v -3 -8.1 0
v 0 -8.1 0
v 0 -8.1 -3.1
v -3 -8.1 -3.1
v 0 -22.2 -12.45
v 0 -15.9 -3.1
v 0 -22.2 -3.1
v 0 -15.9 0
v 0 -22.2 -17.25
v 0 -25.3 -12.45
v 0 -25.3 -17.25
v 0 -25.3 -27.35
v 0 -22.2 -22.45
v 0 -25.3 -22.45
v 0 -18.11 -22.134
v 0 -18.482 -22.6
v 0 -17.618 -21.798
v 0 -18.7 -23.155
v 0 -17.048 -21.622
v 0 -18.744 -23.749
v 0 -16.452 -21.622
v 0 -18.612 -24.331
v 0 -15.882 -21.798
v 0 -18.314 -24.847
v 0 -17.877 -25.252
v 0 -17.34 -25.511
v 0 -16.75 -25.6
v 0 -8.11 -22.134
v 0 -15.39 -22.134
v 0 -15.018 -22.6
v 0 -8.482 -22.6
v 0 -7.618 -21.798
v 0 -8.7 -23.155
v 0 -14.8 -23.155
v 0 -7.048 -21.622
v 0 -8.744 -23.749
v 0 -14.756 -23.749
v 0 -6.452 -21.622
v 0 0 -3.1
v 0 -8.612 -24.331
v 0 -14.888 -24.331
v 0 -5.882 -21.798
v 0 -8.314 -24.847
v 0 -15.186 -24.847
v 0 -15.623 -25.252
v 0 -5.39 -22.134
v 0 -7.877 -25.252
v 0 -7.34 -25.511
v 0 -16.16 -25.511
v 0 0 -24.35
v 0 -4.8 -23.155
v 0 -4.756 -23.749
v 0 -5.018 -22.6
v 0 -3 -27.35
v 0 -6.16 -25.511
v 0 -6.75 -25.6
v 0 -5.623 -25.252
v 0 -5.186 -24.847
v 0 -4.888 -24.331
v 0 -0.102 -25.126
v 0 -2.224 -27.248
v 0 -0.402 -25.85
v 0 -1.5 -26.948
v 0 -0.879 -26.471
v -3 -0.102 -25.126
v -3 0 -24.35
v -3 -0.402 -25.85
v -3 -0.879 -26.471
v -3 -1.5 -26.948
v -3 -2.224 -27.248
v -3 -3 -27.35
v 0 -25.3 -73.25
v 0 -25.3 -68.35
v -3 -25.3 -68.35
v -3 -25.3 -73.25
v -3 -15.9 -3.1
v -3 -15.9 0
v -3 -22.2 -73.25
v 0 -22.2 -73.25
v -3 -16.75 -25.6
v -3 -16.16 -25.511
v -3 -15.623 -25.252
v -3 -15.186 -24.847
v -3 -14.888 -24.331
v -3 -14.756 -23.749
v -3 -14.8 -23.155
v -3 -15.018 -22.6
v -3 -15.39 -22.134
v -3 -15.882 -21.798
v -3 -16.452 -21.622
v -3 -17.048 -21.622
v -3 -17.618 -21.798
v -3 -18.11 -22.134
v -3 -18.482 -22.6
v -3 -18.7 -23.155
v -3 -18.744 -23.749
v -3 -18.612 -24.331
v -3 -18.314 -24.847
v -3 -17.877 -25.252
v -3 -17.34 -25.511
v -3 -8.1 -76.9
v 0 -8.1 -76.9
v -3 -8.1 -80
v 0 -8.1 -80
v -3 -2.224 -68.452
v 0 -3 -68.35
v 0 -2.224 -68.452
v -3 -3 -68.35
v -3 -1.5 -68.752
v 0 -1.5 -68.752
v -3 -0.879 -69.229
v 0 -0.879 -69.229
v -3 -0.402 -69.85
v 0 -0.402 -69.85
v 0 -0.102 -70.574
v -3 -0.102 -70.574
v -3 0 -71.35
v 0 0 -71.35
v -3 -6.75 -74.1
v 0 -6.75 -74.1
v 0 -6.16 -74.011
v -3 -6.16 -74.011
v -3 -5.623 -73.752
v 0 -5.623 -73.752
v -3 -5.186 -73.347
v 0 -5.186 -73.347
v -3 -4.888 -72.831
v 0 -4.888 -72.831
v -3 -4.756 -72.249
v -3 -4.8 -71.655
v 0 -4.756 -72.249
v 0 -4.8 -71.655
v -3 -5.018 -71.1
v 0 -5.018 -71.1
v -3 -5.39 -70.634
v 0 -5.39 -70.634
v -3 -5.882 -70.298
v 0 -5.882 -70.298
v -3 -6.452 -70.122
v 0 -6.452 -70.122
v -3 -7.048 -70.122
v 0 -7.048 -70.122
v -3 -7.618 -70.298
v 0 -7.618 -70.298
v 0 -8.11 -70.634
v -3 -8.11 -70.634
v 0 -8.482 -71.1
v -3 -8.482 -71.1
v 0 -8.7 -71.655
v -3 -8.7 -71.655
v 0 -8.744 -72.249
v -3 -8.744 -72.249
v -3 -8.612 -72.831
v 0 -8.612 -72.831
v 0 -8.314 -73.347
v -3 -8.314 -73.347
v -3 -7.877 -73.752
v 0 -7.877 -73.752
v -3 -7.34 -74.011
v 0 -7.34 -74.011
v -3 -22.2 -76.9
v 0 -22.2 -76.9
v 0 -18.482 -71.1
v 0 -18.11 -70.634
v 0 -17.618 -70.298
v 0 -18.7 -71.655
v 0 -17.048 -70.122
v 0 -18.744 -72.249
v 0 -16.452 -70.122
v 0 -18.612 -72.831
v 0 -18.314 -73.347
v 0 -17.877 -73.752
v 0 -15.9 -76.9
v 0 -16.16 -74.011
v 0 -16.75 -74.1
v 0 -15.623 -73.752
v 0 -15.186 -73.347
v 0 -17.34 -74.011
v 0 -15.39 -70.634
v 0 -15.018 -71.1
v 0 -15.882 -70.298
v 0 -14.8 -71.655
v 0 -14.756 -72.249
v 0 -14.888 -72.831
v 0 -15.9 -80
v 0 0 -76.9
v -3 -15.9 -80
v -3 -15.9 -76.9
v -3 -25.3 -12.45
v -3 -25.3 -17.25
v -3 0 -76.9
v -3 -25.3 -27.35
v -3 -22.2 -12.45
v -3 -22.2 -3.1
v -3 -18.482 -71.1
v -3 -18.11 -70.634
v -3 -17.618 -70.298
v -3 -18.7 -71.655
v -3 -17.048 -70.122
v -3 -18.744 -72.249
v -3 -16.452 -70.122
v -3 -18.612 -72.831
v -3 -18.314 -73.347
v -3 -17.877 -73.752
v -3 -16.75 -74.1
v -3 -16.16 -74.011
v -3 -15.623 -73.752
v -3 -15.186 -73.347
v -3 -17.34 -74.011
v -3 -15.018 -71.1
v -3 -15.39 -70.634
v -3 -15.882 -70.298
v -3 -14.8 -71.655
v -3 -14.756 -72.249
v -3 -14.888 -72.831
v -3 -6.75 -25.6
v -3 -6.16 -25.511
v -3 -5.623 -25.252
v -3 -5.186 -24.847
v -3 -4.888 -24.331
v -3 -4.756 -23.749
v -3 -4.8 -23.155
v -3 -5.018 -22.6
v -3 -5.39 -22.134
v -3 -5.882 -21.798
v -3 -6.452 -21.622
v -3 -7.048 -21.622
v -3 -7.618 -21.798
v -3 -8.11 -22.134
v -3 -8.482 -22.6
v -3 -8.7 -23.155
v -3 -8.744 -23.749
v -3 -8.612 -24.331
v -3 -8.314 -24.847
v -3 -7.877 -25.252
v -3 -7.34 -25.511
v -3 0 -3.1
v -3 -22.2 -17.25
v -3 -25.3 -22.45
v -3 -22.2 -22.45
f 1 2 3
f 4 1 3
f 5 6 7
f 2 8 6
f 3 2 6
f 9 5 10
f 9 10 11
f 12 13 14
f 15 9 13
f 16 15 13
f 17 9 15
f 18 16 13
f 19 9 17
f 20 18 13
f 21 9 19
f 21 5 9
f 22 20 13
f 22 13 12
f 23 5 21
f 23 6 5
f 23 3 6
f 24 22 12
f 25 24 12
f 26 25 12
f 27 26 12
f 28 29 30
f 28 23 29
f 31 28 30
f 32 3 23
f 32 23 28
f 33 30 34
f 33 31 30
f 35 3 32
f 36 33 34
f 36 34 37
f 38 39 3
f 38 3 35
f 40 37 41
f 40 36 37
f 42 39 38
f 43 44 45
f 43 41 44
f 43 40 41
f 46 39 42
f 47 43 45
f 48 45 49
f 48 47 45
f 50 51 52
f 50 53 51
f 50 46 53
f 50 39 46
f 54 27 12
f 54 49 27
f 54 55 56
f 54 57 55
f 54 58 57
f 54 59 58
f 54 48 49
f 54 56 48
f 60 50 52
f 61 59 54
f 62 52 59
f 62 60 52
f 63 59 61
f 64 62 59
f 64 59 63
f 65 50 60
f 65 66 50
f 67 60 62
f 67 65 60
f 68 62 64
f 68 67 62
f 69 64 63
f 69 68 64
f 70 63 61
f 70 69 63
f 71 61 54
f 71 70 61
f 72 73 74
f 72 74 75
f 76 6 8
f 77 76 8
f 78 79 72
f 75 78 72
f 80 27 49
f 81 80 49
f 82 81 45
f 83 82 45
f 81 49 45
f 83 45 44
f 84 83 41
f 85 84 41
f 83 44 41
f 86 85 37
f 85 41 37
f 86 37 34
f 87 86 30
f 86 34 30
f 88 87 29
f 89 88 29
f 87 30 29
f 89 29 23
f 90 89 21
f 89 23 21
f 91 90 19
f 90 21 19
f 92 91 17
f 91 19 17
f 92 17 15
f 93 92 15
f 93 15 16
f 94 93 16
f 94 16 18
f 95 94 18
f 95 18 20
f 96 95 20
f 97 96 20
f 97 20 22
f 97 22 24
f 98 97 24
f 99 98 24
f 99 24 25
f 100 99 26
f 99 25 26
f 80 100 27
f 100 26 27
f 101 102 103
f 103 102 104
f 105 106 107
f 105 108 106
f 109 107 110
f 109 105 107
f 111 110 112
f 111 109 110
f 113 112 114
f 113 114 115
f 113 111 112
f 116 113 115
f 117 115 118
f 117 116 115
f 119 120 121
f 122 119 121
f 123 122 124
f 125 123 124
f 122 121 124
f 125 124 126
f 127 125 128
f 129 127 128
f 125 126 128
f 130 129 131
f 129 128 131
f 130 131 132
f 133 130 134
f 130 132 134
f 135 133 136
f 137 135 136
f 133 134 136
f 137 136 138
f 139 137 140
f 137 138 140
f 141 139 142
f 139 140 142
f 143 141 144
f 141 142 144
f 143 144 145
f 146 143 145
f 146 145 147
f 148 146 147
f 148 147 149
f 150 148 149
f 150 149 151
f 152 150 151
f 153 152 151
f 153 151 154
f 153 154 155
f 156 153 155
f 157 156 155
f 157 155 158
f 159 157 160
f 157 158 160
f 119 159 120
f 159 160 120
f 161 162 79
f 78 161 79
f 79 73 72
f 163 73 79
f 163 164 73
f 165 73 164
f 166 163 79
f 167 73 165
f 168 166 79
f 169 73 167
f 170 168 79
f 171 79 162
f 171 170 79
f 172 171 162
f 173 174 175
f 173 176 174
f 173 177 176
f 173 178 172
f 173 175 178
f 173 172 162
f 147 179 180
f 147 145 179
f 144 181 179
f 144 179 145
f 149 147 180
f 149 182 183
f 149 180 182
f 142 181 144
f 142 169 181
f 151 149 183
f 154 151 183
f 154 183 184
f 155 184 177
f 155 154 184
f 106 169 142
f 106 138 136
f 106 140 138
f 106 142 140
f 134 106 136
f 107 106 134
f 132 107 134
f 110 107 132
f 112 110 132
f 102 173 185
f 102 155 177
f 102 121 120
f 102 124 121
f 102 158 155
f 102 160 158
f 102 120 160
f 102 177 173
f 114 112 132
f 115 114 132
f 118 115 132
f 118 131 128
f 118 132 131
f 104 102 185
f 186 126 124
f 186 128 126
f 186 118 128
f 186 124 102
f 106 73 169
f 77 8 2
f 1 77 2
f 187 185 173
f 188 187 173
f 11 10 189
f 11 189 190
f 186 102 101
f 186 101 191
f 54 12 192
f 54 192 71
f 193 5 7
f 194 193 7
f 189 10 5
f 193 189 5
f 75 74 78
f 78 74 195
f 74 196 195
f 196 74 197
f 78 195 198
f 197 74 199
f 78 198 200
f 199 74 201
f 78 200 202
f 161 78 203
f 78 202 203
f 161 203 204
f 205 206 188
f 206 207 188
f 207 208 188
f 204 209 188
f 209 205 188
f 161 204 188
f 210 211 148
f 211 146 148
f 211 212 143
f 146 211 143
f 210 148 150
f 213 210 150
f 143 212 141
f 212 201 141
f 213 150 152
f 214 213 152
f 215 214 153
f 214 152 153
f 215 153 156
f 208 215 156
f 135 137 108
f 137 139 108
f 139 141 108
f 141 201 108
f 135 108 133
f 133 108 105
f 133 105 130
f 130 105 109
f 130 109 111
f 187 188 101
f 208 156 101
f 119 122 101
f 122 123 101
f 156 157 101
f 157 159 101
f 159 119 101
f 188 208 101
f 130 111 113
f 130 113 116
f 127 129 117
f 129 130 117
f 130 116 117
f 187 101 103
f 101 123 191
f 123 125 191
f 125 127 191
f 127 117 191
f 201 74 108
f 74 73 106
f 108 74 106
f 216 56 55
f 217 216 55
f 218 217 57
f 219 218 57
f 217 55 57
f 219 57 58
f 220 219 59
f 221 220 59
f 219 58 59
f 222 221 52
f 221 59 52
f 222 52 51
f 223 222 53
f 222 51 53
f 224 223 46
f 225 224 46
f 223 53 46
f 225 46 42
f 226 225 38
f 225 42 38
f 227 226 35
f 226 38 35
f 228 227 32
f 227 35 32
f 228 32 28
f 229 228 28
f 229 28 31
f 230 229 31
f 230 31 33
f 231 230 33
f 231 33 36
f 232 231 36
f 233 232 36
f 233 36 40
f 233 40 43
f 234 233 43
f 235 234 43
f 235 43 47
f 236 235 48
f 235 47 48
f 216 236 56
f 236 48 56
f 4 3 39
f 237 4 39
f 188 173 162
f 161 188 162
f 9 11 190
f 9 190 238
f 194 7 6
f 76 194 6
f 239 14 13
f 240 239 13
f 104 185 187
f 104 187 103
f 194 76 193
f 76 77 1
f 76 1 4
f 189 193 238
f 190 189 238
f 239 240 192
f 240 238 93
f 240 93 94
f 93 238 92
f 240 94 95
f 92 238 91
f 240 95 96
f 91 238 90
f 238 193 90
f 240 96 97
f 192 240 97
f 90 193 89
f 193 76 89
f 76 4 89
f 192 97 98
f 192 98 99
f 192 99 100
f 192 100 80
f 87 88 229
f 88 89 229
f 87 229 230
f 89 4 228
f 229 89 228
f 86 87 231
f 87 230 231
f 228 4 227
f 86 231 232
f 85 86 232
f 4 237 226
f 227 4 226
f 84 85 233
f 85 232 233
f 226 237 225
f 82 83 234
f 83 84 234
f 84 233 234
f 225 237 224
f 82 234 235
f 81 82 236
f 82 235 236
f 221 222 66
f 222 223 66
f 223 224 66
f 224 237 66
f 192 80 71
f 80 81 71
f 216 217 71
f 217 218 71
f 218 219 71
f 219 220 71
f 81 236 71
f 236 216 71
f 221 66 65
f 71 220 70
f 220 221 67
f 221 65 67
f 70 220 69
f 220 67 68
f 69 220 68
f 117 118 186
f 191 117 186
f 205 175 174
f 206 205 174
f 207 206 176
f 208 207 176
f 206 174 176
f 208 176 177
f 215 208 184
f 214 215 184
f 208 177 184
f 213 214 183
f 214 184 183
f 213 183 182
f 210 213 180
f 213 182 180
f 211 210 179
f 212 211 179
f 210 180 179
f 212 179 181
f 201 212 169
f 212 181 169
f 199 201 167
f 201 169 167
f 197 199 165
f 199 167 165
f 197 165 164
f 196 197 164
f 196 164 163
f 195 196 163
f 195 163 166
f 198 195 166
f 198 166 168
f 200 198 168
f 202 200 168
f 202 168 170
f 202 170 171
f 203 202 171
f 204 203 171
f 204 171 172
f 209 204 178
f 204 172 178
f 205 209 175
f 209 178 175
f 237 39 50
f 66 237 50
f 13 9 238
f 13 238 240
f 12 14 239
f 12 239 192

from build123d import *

# Parameters (mm, degrees)
SKETCH1_W             = 27.35
SKETCH1_H             = 25.3
SKETCH1_R             = 2
BOSS_EXTRUDE1_DEPTH   = 3
SKETCH1_W_2           = 11.65
BOSS_EXTRUDE1_2_DEPTH = 3
SKETCH3_W             = 5.2
SKETCH3_H             = 3.2
SKETCH3_W_2           = 3.2
SKETCH3_H_2           = 8.2
CUT_EXTRUDE1_DEPTH    = 4
FILLET1_R             = 3
FILLET2_R             = 3


with BuildPart() as part:
    # Sketch1 → Boss-Extrude1 (new body)
    with BuildSketch(Plane(origin=(0, 0, 0), x_dir=(0, 0, -1), z_dir=(1, 0, 0))):
        with Locations((13.675, -12.65)):
            Rectangle(SKETCH1_W, SKETCH1_H)
        with Locations((23.6, -6.75)):
            Circle(SKETCH1_R, mode=Mode.SUBTRACT)
        with Locations((23.6, -16.75)):
            Circle(SKETCH1_R, mode=Mode.SUBTRACT)
    extrude(amount=-BOSS_EXTRUDE1_DEPTH)


with BuildPart() as body_2:
    # Sketch1 → Boss-Extrude1 2 (new body)
    with BuildSketch(Plane(origin=(0, 0, 0), x_dir=(0, 0, -1), z_dir=(1, 0, 0))):
        with Locations((74.175, -12.65)):
            Rectangle(SKETCH1_W_2, SKETCH1_H)
        with Locations((72.1, -6.75)):
            Circle(SKETCH1_R, mode=Mode.SUBTRACT)
        with Locations((72.1, -16.75)):
            Circle(SKETCH1_R, mode=Mode.SUBTRACT)
    extrude(amount=-BOSS_EXTRUDE1_2_DEPTH)


with BuildPart() as cut_extrude1_tool:
    # Sketch3 → Cut-Extrude1 (new body, through all)
    with BuildSketch(Plane(origin=(0, 0, 0), x_dir=(0, 0, -1), z_dir=(1, 0, 0))):
        with Locations((19.85, -23.8)):
            Rectangle(SKETCH3_W, SKETCH3_H)
        with Locations((78.5, -4)):
            Rectangle(SKETCH3_W_2, SKETCH3_H_2)
        with Locations((1.5, -4)):
            Rectangle(SKETCH3_W_2, SKETCH3_H_2)
        Polygon((76.9, -15.9), (76.9, -22.2), (73.25, -22.2), (73.25, -25.4), (80.1, -25.4), (80.1, -15.9), align=None)
        Polygon((12.45, -22.2), (3.1, -22.2), (3.1, -15.9), (-0.1, -15.9), (-0.1, -25.4), (12.45, -25.4), align=None)
    extrude(amount=-CUT_EXTRUDE1_DEPTH)


with BuildPart() as part_1:
    add(part.part)

    # Cut-Extrude1: cut by cut_extrude1_tool
    add(cut_extrude1_tool.part, mode=Mode.SUBTRACT)

    # Fillet1
    fillet1_edges = [part_1.edges().sort_by_distance(p)[0] for p in [
        (-1.5, 0, -27.35),
    ]]
    fillet(fillet1_edges, radius=FILLET1_R)


with BuildPart() as body_2_1:
    add(body_2.part)

    # Cut-Extrude1: cut by cut_extrude1_tool
    add(cut_extrude1_tool.part, mode=Mode.SUBTRACT)

    # Fillet2
    fillet2_edges = [body_2_1.edges().sort_by_distance(p)[0] for p in [
        (-1.5, 0, -68.35),
    ]]
    fillet(fillet2_edges, radius=FILLET2_R)


solid = Compound([part_1.part, body_2_1.part])
